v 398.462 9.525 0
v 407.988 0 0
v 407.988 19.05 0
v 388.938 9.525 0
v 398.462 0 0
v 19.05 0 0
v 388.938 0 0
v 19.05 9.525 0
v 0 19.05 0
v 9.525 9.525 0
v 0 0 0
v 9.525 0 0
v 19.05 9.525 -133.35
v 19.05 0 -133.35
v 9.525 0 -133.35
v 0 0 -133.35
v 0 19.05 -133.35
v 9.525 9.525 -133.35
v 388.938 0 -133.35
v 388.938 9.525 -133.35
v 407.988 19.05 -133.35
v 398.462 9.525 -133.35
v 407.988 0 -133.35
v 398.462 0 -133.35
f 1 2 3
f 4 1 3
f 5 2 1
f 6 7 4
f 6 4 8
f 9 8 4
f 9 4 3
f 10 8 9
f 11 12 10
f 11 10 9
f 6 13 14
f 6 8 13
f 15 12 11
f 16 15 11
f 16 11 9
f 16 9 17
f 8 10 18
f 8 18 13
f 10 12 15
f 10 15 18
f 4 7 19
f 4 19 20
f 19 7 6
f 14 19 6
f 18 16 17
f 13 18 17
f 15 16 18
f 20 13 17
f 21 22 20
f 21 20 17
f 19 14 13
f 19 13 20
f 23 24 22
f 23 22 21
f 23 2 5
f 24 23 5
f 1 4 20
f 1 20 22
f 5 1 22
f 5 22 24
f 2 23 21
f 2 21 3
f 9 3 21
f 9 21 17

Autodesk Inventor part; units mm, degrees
ref_plane "YZ Plane" through (0, 0, 0) normal (1, 0, 0) x (0, 1, 0)
ref_plane "XZ Plane" through (0, 0, 0) normal (0, 1, 0) x (-1, 0, 0)
ref_plane "XY Plane" through (0, 0, 0) normal (0, 0, 1) x (1, 0, 0)
sketch "Sketch1" plane through (0, 0, 0) normal (0, 1, 0) x (-1, 0, 0)
  line L0 (0, -133.35) -> (-407.9875, -133.35)
  line L1 (-407.9875, -133.35) -> (-407.9875, 0)
  line L2 (-407.9875, 0) -> (0, 0)
  line L3 (0, 0) -> (0, -133.35)
  dimension "d0" = 407.9875
  dimension "d1" = 133.35
extrude "Board" add sketch "Sketch1" along normal blind 19.05
sketch "Sketch2" plane through (0, 0, 0) normal (0, 0, 1) x (1, 0, 0)
  line L0 (19.05, 0) -> (9.525, 0)
  line L1 (9.525, 0) -> (9.525, 9.525)
  line L2 (9.525, 9.525) -> (19.05, 9.525)
  line L3 (19.05, 9.525) -> (19.05, 0)
  line L4 (0, 0) -> (0, 19.05) projected
  line L5 (407.9875, 0) -> (0, 0) projected
  line L6 (398.4625, 0) -> (388.9375, 0)
  line L7 (388.9375, 0) -> (388.9375, 9.525)
  line L8 (388.9375, 9.525) -> (398.4625, 9.525)
  line L9 (398.4625, 9.525) -> (398.4625, 0)
  line L10 (407.9875, 0) -> (407.9875, 19.05) projected
  dimension "d4" = 9.525
  dimension "d5" = 9.525
  dimension "d6" = 9.525
  dimension "d10" = 9.525
extrude "Dado" cut sketch "Sketch2" against normal blind 133.35
equation "\"d0\" = DoorWidth"
equation "\"d10\" = d6"
equation "\"d7\" = d1"
equation "\"DoorWidth\" = 407.9875"
properties part number "Door top" material "Wood (Oak)"
